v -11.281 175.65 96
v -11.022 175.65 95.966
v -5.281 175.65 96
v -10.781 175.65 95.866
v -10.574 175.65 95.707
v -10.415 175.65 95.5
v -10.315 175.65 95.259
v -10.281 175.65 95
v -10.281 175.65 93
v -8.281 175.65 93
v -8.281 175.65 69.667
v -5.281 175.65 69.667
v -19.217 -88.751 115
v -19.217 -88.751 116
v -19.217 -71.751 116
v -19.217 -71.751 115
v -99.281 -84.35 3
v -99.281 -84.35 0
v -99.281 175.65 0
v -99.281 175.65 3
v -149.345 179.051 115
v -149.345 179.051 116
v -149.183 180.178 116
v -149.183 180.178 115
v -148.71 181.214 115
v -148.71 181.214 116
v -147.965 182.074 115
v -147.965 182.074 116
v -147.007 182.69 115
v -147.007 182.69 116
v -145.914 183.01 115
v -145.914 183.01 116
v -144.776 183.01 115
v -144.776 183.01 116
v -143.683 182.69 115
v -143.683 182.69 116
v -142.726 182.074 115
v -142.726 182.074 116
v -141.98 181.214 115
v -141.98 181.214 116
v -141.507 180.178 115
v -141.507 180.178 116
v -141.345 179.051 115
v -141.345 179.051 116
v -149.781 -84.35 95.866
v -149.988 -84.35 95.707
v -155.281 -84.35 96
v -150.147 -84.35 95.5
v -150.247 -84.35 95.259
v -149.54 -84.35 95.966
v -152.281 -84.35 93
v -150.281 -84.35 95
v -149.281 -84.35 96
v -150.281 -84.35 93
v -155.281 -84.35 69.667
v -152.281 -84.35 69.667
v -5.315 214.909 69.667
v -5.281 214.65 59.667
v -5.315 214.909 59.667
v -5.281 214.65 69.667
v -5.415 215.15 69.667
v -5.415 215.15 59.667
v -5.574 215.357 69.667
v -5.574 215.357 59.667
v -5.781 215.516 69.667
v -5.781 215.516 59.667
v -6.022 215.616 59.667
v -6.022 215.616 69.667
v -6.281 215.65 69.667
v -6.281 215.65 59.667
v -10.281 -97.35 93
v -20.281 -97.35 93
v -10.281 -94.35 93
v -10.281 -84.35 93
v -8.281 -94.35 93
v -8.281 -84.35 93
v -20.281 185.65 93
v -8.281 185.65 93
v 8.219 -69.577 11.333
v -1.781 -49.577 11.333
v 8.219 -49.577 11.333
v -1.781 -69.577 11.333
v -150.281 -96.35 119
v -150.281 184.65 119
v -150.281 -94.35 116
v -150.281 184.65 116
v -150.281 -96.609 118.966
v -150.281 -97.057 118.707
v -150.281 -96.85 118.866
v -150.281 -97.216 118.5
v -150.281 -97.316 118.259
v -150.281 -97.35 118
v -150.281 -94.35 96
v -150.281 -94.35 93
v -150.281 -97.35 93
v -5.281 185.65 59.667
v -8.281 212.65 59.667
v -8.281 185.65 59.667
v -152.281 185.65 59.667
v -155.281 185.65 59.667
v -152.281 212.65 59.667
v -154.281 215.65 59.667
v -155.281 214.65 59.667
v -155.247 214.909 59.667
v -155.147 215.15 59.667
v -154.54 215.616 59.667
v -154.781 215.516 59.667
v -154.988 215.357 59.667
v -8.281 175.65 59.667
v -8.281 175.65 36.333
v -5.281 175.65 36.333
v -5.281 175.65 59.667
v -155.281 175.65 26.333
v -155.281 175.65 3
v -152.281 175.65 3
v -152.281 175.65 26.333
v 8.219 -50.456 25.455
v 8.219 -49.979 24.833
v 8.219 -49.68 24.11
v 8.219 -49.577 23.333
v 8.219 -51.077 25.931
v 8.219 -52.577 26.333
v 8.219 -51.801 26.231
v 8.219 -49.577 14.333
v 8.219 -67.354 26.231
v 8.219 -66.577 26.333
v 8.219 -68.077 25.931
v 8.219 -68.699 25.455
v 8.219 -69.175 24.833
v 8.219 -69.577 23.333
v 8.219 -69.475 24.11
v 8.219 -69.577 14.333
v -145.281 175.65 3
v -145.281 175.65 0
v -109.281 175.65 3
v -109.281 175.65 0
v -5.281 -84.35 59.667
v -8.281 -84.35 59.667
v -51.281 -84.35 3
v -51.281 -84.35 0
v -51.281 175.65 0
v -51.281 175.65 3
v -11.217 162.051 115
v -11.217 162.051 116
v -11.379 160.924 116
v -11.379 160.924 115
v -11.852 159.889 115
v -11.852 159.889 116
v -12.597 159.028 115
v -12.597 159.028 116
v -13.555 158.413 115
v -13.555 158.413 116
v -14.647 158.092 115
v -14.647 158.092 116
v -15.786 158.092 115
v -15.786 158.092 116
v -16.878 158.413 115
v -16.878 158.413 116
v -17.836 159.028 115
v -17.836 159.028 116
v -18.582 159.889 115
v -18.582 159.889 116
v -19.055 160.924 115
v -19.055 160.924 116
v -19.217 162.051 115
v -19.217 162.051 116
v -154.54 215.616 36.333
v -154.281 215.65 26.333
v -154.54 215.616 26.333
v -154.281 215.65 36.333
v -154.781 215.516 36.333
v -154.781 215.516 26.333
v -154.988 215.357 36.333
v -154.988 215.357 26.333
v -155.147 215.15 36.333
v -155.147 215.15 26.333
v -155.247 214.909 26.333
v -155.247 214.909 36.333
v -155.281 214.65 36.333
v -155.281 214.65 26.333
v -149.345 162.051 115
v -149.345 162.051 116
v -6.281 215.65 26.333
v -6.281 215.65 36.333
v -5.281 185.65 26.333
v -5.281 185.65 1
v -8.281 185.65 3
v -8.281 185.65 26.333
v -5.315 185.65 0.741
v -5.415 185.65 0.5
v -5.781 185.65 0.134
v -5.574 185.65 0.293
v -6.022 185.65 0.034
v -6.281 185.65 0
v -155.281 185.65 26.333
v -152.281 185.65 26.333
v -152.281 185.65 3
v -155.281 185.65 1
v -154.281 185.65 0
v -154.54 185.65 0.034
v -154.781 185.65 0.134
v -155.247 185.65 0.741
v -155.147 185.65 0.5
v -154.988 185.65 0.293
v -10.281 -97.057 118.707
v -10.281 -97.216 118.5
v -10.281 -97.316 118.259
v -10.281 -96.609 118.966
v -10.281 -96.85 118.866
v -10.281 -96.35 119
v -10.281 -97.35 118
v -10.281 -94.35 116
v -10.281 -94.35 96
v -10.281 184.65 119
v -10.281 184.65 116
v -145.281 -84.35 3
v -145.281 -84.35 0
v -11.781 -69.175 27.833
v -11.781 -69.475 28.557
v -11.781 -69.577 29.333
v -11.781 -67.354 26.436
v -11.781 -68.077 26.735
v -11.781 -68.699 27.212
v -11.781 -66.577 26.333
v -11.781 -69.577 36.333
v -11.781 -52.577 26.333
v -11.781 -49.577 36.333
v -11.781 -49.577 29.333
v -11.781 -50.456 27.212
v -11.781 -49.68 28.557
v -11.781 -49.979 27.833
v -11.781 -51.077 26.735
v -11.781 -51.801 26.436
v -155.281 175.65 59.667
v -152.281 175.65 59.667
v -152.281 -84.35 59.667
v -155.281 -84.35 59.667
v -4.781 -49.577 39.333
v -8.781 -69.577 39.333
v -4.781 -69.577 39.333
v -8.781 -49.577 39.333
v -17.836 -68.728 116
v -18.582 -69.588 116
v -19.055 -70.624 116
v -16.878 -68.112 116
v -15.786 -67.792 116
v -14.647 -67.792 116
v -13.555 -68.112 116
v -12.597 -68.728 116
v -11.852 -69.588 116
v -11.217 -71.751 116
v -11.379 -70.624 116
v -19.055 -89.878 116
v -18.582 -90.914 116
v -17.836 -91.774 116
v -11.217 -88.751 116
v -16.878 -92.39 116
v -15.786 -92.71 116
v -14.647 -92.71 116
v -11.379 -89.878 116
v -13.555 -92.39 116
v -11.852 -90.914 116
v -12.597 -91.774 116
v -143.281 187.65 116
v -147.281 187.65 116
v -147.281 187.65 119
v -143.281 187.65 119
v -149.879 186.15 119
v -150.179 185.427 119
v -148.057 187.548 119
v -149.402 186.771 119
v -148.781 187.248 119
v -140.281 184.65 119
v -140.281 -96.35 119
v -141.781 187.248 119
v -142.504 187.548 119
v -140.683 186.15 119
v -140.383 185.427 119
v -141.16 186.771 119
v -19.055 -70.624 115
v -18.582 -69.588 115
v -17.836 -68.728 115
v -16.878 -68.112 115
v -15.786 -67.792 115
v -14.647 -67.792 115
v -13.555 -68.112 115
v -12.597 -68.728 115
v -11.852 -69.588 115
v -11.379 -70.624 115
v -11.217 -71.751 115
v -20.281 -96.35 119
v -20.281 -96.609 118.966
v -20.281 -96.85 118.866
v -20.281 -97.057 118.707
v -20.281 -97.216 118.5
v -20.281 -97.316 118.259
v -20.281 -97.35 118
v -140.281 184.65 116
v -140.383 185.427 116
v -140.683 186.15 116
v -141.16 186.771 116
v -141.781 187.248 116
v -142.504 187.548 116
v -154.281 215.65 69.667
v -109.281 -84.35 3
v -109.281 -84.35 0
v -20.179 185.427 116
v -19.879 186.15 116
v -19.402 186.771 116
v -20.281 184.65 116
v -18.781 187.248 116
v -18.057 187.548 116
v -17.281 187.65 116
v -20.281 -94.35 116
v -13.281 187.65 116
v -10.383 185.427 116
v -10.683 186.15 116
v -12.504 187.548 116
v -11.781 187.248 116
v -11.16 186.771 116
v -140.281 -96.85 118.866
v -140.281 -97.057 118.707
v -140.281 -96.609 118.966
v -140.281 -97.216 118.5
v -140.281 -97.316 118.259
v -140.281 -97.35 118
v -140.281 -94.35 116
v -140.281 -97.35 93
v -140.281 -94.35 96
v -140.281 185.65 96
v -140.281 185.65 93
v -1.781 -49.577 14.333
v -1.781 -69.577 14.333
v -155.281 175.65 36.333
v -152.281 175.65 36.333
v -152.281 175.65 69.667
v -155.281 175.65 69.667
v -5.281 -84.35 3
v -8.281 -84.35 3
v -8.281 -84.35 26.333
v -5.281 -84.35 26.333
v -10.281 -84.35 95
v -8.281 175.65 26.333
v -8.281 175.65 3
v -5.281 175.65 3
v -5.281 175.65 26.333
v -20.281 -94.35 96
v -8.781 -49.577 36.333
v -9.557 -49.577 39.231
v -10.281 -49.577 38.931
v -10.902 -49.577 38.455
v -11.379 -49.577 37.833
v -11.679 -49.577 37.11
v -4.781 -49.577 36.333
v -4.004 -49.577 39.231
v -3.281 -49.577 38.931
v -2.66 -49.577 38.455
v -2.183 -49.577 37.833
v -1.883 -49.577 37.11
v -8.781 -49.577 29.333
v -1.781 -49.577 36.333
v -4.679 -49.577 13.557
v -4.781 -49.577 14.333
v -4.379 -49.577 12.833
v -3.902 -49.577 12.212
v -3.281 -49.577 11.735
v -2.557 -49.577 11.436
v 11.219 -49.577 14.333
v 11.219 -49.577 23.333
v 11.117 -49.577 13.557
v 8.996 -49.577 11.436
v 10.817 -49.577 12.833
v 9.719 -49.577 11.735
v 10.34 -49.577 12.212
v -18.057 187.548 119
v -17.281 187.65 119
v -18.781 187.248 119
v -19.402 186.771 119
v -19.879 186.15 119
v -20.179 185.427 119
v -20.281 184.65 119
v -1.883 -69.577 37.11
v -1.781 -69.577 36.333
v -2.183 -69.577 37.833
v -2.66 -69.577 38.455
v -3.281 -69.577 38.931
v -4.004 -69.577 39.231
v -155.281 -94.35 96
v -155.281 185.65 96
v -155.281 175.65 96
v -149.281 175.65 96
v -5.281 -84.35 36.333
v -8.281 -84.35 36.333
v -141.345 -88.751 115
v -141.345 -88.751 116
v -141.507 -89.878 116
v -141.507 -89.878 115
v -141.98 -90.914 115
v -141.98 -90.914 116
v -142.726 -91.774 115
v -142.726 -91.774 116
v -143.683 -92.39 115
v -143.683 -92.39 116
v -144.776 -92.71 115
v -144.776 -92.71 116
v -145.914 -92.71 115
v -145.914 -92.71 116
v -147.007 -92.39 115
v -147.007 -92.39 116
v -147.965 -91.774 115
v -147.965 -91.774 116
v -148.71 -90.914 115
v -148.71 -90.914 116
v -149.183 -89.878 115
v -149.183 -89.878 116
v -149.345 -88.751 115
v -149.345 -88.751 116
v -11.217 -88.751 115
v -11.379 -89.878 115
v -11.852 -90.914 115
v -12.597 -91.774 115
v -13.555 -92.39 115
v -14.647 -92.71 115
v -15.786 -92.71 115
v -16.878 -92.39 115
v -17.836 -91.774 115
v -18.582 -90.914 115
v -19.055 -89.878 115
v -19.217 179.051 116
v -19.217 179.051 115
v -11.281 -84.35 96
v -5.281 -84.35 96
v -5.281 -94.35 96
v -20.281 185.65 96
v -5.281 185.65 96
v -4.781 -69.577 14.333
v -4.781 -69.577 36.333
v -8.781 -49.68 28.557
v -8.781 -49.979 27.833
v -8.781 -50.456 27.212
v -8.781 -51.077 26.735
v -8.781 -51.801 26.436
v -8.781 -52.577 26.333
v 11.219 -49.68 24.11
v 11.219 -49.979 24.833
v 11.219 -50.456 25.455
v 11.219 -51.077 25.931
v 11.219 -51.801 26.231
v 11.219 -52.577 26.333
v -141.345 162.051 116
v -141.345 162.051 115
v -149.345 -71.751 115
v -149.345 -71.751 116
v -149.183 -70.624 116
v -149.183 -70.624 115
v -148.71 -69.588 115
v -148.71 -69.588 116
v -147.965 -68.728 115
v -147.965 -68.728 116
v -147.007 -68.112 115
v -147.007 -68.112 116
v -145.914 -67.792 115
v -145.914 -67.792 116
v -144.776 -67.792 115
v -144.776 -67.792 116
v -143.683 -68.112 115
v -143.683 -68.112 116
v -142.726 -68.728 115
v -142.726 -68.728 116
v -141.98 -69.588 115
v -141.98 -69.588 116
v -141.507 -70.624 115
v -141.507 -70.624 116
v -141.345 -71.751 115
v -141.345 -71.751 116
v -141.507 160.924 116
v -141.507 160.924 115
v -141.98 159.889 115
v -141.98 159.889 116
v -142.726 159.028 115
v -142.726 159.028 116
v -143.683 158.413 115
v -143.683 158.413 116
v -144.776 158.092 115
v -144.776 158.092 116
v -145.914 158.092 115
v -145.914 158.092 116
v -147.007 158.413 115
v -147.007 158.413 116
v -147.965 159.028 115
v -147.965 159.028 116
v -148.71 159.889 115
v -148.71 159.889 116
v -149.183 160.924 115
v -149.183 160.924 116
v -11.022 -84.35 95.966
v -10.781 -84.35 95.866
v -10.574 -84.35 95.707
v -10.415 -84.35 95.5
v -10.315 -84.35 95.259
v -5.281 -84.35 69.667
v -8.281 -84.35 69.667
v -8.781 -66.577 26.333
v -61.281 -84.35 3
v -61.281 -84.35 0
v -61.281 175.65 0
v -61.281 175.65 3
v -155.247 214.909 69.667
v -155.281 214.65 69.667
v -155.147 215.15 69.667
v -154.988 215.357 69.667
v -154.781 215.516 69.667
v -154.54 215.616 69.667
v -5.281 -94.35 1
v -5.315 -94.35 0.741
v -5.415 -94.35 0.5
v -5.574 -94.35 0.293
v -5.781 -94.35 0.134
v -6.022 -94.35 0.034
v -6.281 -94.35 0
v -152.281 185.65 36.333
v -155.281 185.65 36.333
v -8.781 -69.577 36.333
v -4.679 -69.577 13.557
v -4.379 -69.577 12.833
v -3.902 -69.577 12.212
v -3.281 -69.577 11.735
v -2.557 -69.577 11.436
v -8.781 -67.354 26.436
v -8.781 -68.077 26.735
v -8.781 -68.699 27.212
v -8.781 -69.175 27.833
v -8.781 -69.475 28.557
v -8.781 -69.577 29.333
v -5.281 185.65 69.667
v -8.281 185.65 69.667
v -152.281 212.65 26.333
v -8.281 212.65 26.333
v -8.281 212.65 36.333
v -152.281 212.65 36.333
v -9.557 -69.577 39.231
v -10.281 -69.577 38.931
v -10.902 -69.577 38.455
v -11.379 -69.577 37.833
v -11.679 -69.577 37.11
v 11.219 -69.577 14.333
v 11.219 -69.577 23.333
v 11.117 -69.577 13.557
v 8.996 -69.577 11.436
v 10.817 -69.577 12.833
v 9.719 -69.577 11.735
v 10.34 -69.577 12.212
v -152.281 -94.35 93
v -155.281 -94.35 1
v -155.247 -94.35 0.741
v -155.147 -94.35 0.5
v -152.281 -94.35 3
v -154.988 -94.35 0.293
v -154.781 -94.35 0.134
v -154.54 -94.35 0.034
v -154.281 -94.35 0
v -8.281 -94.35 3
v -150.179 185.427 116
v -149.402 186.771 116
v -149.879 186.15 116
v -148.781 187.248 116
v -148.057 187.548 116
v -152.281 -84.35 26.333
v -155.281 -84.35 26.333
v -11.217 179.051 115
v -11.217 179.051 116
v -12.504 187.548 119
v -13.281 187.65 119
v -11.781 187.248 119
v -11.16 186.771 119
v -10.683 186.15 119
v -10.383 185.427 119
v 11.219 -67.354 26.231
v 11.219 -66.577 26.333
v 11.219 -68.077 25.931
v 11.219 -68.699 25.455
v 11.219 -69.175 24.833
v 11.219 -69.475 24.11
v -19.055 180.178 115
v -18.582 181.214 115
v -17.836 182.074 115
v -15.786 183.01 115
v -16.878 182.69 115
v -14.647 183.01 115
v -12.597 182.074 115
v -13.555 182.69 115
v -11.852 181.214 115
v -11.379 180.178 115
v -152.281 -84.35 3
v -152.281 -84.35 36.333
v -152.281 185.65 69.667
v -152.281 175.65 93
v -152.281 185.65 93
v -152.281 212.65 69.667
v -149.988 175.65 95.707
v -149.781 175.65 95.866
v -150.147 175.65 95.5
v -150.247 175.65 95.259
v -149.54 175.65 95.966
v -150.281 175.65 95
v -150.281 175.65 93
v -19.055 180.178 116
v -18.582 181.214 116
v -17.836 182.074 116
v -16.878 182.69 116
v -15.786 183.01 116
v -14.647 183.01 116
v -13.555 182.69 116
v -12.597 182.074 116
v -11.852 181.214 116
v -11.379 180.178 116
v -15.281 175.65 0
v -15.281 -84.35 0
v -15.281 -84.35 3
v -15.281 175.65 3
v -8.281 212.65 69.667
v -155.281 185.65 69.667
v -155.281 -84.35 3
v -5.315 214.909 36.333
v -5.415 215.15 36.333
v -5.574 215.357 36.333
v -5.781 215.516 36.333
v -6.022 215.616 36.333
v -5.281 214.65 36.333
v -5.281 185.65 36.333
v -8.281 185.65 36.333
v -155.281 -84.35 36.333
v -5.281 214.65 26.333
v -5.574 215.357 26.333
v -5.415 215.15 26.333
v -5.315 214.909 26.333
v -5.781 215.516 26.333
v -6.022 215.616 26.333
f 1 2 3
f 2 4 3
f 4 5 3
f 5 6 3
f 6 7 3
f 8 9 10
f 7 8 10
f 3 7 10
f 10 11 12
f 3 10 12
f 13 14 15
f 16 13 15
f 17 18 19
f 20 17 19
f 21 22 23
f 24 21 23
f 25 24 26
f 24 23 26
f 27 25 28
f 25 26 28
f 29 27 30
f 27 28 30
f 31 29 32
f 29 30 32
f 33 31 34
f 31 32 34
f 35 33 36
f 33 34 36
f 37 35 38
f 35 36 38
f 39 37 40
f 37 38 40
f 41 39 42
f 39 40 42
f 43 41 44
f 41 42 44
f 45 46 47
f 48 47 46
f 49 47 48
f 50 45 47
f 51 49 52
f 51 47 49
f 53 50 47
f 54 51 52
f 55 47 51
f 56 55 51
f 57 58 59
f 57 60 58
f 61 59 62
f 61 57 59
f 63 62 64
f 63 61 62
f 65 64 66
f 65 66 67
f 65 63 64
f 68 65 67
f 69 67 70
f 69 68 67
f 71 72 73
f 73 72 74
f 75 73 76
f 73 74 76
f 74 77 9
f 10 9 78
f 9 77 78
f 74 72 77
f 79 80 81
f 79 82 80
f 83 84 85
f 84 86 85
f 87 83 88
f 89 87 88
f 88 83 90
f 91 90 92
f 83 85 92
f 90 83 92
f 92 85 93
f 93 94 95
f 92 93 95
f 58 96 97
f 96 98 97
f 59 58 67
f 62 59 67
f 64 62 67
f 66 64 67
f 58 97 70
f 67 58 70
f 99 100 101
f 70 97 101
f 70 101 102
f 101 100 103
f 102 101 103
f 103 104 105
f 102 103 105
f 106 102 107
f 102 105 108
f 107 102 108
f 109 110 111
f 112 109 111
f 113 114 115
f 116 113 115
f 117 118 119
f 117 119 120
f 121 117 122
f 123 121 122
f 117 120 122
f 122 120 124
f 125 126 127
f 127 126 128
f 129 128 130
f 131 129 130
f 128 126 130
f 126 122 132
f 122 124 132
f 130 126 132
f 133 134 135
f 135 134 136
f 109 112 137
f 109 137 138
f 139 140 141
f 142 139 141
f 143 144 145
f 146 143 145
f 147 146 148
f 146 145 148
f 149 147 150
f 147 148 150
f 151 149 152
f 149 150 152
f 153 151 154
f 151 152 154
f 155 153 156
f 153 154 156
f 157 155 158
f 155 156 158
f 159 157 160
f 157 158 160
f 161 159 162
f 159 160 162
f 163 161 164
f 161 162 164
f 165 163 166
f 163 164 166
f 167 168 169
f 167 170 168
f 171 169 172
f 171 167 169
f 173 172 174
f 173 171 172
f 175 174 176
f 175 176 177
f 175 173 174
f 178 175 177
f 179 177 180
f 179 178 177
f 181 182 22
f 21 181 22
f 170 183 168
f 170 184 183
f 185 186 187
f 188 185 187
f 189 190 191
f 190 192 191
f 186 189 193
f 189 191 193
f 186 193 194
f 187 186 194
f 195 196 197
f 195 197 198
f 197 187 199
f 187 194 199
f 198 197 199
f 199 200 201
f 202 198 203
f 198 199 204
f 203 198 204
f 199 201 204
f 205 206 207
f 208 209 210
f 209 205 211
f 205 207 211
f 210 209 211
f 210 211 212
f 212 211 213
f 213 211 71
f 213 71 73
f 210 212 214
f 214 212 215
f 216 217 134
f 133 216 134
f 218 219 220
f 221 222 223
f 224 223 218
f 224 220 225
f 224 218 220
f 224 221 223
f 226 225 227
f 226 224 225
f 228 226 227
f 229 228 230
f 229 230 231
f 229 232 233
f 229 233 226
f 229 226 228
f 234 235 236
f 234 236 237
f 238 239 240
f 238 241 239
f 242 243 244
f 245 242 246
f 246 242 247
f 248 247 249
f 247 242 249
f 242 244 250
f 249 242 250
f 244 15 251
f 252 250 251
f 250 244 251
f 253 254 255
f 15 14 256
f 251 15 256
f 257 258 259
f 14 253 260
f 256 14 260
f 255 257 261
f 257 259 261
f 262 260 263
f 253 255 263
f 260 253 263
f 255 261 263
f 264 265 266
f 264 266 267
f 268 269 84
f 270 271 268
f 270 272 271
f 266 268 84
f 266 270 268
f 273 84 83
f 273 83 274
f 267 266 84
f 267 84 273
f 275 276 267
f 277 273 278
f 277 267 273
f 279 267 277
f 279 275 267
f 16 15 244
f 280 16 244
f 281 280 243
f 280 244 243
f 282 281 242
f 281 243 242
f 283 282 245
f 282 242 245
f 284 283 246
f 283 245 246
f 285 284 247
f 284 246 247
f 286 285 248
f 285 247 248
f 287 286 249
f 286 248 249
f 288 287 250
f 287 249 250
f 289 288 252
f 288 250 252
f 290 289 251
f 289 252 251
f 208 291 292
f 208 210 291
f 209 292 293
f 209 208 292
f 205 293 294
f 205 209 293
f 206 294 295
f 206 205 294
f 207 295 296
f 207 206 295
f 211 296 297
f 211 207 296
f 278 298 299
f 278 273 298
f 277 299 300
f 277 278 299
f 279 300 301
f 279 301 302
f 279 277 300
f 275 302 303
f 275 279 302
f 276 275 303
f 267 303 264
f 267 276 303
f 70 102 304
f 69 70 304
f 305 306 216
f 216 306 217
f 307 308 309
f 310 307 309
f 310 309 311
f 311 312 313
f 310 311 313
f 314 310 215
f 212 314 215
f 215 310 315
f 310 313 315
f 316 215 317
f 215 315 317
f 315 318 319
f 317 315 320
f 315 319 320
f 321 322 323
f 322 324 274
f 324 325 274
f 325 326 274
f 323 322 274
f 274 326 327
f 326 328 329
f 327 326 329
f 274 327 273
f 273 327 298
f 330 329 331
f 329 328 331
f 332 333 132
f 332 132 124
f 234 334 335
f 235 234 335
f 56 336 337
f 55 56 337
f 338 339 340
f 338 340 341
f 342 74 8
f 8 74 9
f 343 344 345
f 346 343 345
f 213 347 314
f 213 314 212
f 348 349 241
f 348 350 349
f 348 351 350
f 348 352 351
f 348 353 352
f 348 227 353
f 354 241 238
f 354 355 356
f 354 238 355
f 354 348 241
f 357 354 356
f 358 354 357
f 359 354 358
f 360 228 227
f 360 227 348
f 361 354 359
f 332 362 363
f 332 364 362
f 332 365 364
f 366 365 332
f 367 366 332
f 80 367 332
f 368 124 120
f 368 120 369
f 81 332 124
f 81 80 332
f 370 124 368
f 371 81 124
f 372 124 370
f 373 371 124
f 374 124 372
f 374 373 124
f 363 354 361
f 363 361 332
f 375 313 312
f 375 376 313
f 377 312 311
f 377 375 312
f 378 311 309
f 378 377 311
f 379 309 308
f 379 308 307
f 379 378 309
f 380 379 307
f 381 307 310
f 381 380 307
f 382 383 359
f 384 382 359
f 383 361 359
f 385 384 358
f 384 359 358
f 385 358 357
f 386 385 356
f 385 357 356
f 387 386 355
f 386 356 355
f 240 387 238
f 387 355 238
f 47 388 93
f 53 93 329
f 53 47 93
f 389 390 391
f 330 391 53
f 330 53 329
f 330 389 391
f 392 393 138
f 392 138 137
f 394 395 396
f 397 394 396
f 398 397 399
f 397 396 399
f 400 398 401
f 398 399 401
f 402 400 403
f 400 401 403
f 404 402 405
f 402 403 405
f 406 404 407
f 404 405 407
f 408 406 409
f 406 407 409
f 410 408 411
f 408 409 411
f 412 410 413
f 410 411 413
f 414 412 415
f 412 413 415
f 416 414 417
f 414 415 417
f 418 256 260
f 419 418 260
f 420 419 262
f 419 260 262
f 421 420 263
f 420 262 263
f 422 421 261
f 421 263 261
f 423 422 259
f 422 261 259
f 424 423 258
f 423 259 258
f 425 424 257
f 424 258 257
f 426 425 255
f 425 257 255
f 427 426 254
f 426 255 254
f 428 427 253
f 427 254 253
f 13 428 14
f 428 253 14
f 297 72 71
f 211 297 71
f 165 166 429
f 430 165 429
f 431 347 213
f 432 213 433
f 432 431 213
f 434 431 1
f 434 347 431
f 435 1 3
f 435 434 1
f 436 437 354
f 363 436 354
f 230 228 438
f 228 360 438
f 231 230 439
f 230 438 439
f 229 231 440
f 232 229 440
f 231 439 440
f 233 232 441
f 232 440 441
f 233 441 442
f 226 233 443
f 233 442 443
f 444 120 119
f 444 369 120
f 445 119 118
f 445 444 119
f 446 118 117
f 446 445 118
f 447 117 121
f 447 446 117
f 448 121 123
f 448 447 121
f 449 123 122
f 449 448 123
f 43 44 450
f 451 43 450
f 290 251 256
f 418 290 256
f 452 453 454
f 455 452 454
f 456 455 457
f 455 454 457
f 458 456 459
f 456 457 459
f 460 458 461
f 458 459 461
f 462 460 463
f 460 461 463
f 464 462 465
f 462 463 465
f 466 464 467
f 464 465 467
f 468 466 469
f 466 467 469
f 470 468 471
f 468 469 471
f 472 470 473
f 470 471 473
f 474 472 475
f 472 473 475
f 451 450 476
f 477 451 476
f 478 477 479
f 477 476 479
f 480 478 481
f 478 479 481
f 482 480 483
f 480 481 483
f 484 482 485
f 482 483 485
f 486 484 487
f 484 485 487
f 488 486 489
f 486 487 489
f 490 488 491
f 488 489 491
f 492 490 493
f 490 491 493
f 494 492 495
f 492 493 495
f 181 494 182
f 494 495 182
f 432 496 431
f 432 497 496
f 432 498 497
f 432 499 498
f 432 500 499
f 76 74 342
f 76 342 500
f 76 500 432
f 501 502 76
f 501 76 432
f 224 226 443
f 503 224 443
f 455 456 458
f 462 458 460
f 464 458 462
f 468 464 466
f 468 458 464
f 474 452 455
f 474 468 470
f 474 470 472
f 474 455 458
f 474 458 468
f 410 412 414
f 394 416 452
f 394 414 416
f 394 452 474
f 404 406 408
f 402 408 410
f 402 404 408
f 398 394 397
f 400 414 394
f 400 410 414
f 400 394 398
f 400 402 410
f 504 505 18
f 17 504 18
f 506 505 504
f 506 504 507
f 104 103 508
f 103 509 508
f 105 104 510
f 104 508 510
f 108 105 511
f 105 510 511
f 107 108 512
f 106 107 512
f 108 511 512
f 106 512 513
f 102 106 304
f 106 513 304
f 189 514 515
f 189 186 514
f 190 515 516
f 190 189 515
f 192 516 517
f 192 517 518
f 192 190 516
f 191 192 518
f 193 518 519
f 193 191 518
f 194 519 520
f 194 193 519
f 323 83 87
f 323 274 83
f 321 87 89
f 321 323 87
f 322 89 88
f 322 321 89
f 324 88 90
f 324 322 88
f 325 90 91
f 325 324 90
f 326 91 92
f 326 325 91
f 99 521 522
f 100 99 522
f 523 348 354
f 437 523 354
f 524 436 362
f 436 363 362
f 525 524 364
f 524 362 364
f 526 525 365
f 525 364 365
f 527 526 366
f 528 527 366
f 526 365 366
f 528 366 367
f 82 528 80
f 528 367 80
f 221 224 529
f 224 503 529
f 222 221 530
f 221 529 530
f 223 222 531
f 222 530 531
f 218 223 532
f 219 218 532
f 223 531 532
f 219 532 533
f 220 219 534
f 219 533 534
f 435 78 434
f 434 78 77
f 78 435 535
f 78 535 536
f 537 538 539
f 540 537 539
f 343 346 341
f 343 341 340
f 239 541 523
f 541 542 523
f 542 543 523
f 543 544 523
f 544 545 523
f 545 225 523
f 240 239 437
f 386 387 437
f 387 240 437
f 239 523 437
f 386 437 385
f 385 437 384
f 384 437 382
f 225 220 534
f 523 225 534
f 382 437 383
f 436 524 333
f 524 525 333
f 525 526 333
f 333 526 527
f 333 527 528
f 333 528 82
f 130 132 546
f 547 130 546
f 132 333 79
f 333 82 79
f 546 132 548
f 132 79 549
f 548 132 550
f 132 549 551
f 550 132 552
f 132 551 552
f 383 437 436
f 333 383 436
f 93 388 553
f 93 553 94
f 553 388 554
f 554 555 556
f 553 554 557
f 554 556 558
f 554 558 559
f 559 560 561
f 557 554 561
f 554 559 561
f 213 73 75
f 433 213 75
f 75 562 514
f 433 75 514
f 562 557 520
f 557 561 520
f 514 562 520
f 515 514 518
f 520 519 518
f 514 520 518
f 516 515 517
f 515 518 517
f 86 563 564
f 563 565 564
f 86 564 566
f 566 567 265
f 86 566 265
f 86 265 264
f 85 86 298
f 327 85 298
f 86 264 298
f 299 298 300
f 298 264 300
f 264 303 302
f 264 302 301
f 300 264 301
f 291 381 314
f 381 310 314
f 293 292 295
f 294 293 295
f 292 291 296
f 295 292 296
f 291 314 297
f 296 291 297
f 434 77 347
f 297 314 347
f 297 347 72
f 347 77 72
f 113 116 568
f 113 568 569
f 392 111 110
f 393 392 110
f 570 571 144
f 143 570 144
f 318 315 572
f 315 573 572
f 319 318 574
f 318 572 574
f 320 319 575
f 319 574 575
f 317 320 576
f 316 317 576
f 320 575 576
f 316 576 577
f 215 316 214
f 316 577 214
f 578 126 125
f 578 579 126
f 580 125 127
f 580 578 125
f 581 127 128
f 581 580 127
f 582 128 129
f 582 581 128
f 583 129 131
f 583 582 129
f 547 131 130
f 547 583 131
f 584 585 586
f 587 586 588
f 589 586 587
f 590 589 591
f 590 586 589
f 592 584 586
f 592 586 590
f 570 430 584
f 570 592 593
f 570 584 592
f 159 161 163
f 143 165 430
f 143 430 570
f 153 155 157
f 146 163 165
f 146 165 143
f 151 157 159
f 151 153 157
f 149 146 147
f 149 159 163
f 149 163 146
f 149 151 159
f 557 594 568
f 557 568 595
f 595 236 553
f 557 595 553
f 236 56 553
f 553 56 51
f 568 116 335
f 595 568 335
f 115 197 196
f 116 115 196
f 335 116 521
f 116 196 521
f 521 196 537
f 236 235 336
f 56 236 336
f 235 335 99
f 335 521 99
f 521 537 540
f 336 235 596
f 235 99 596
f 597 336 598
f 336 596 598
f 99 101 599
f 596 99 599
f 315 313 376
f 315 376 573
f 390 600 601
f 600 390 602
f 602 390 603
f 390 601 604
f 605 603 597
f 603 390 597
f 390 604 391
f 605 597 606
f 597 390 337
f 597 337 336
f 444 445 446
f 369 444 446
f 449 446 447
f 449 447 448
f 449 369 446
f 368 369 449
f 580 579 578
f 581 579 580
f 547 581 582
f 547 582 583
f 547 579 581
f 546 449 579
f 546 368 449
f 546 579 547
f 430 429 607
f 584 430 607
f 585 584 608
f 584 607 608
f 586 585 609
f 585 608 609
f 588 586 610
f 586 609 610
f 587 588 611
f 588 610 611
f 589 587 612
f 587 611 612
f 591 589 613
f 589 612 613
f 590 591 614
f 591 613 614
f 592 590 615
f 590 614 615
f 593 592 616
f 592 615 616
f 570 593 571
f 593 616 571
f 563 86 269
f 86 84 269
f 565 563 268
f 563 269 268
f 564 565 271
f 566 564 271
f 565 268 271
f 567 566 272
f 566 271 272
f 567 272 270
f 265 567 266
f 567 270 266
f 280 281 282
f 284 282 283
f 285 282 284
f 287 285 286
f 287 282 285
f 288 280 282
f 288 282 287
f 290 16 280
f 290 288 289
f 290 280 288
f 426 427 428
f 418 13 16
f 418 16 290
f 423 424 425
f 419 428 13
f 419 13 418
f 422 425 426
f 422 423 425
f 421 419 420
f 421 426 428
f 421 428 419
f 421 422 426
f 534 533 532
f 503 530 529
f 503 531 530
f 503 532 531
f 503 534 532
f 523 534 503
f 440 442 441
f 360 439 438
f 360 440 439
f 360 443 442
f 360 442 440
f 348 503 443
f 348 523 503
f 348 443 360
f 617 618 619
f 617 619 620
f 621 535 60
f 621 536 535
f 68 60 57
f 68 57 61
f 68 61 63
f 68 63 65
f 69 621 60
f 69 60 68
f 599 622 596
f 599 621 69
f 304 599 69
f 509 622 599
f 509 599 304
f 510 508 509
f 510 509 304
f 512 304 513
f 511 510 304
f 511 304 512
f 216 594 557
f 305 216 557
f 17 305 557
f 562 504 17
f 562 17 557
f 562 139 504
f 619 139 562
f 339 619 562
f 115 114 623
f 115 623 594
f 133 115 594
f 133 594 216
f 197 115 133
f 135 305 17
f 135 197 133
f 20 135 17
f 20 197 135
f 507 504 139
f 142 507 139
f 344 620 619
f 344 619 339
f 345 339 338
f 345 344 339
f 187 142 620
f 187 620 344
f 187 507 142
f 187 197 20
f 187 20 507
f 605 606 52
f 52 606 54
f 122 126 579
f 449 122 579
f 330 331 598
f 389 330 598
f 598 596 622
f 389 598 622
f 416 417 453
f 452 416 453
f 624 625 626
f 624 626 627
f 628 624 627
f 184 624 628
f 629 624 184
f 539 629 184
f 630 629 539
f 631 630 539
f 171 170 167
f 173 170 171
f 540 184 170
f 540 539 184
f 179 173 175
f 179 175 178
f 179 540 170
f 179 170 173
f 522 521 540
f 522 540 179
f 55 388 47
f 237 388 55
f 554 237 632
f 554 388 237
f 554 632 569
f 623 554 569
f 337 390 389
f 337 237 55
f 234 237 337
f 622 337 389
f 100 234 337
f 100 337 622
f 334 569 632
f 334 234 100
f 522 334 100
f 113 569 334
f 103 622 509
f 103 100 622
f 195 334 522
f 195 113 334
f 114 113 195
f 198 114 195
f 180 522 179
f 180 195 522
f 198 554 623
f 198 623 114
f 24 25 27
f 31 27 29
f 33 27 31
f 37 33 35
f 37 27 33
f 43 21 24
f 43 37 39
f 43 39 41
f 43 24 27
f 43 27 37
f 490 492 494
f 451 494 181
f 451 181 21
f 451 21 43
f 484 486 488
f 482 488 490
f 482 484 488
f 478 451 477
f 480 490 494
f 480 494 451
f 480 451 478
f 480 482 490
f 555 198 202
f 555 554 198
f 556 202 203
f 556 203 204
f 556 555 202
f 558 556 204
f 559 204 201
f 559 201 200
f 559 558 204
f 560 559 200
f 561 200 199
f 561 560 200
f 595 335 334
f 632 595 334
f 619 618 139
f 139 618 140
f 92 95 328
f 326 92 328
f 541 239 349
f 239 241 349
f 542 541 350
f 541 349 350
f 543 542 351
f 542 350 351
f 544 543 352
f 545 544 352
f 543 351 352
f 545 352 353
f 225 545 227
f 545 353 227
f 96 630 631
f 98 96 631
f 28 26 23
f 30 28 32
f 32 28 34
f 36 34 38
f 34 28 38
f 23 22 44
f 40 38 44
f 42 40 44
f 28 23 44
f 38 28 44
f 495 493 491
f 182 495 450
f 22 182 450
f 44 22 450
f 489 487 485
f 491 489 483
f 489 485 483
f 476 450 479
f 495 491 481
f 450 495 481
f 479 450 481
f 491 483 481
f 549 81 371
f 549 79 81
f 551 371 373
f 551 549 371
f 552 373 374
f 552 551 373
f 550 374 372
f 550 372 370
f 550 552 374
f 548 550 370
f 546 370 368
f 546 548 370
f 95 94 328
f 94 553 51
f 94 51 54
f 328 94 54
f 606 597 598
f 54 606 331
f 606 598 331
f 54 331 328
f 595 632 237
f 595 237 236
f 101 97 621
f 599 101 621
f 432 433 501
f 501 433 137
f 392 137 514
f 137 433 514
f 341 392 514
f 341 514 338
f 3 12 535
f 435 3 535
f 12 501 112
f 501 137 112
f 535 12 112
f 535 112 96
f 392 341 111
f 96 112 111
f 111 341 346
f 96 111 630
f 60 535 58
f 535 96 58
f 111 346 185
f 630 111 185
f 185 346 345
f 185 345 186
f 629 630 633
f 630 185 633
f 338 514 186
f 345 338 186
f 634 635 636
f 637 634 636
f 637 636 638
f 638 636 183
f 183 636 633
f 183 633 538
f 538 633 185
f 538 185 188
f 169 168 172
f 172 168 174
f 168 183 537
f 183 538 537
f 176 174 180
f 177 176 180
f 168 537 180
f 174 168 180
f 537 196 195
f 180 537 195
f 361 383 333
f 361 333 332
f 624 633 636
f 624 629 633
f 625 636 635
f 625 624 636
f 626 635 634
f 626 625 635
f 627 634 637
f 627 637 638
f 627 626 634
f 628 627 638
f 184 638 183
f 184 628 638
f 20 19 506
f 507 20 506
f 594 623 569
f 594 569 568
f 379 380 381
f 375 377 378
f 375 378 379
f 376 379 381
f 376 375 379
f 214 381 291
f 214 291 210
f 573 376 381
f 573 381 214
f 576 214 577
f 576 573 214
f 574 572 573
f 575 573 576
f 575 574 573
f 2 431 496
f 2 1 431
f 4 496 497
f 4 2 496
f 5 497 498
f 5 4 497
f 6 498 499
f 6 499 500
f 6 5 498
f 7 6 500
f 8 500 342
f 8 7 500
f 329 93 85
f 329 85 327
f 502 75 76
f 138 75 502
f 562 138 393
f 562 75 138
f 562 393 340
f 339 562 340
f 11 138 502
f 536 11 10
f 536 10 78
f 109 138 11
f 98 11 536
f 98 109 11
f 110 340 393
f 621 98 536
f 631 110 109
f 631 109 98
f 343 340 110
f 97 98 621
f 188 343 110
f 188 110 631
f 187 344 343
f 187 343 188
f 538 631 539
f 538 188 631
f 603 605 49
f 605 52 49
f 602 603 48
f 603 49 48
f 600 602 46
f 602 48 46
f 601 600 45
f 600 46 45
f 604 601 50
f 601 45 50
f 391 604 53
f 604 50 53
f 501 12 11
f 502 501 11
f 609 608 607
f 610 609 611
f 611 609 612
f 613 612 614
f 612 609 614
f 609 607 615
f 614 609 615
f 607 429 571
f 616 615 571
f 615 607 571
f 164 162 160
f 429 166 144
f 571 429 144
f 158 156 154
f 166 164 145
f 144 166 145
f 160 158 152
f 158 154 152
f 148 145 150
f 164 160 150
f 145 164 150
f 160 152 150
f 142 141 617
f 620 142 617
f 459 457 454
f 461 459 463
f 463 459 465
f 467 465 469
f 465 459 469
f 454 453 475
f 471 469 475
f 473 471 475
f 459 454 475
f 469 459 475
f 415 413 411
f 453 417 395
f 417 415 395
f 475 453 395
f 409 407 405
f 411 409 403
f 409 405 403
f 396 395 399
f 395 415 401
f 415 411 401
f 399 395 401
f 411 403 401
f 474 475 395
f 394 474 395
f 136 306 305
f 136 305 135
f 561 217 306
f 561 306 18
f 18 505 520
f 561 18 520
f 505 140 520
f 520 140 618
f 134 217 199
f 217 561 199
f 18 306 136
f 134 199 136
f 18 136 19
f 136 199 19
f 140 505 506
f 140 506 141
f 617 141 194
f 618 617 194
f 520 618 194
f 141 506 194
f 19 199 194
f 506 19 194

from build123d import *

# Parameters (mm, degrees)
F0_W           = 10
F0_H           = 260
F1_DEPTH       = 3
F2_W           = 3
F2_H           = 10
F3_DEPTH       = 90
F4_W           = 2
F4_H           = 10
F4_W_2         = 3
F4_W_3         = 10
F4_H_2         = 3
F4_W_4         = 5
F5_DEPTH       = 3
F6_W           = 10
F6_H           = 3
F7_DEPTH       = 20
F8_W           = 10
F8_H           = 282
F8_H_2         = 285
F8_H_3         = 3
F9_DEPTH       = 3
F10_W          = 3
F10_H          = 10
F11_DEPTH      = 30
F11_DEPTH_BACK = 270
F12_W          = 3
F12_H          = 10
F13_DEPTH      = 144
F14_R          = 1
F15_R          = 3
F17_DEPTH      = 1
F18_W          = 3
F18_H          = 20
F19_DEPTH      = 10
F18_W_2        = 0.5
F20_DEPTH      = 3
F21_DEPTH      = 25
F22_W          = 20
F22_H          = 3
F23_DEPTH      = 10
F24_W          = 3
F24_H          = 20
F25_DEPTH      = 15
F26_R          = 3


# Not quite as in the source:
# - a feature names something its author has since deleted; it is built from what else it names


with BuildPart() as f1:
    # F0 (on Top) → F1 (new body)
    with BuildSketch(Plane.XY):
        Polygon((-5.2808651924, 185.6500792865), (-155.2808651924, 185.6500792865), (-155.2808651924, 175.6500792865), (-145.2808651924, 175.6500792865), (-109.2808651924, 175.6500792865), (-99.2808651924, 175.6500792865), (-61.2808651924, 175.6500792865), (-51.2808651924, 175.6500792865), (-15.2808651924, 175.6500792865), (-5.2808651924, 175.6500792865), align=None)
        with Locations((-104.2808651924, 45.6500792865)):
            Rectangle(F0_W, F0_H)
        with Locations((-56.2808651924, 45.6500792865)):
            Rectangle(F0_W, F0_H)
        Polygon((-145.2808651924, -84.3499207135), (-155.2808651924, -84.3499207135), (-155.2808651924, -94.3499207135), (-5.2808651924, -94.3499207135), (-5.2808651924, -84.3499207135), (-15.2808651924, -84.3499207135), (-51.2808651924, -84.3499207135), (-61.2808651924, -84.3499207135), (-99.2808651924, -84.3499207135), (-109.2808651924, -84.3499207135), align=None)
        with Locations((-150.2808651924, 45.6500792865)):
            Rectangle(F0_W, F0_H)
        with Locations((-10.2808651924, 45.6500792865)):
            Rectangle(F0_W, F0_H)
    extrude(amount=F1_DEPTH)

    # F2 (on face) → F3 (join)
    with BuildSketch(Plane.XY.offset(3)):
        with Locations((-153.7808651924, 180.6500792865)):
            Rectangle(F2_W, F2_H)
        with Locations((-6.7808651924, 180.6500792865)):
            Rectangle(F2_W, F2_H)
        with Locations((-6.7808651924, -89.3499207135)):
            Rectangle(F2_W, F2_H)
        with Locations((-153.7808651924, -89.3499207135)):
            Rectangle(F2_W, F2_H)
    extrude(amount=F3_DEPTH)

    # F4 (on face) → F5 (join)
    with BuildSketch(Plane.XY.offset(93)):
        Polygon((-140.2808651924, 185.6500792865), (-150.2808651924, 185.6500792865), (-150.2808651924, 175.6500792865), (-150.2808651924, -84.3499207135), (-150.2808651924, -94.3499207135), (-140.2808651924, -94.3499207135), align=None)
        with Locations((-151.2808651924, 180.6500792865)):
            Rectangle(F4_W, F4_H)
        with Locations((-153.7808651924, 180.6500792865)):
            Rectangle(F4_W_2, F4_H)
        with Locations((-145.2808651924, -95.8499207135)):
            Rectangle(F4_W_3, F4_H_2)
        with Locations((-15.2808651924, -95.8499207135)):
            Rectangle(F4_W_3, F4_H_2)
        Polygon((-10.2808651924, 185.6500792865), (-20.2808651924, 185.6500792865), (-20.2808651924, -94.3499207135), (-10.2808651924, -94.3499207135), (-10.2808651924, -84.3499207135), (-10.2808651924, 175.6500792865), align=None)
        with Locations((-7.7808651924, -89.3499207135)):
            Rectangle(F4_W_4, F4_H)
        with Locations((-7.7808651924, 180.6500792865)):
            Rectangle(F4_W_4, F4_H)
        with Locations((-152.7808651924, -89.3499207135)):
            Rectangle(F4_W_4, F4_H)
    extrude(amount=F5_DEPTH)

    # F6 (on face) → F7 (join)
    with BuildSketch(Plane.XY.offset(96)):
        with Locations((-145.2808651924, -95.8499207135)):
            Rectangle(F6_W, F6_H)
        with Locations((-15.2808651924, -95.8499207135)):
            Rectangle(F6_W, F6_H)
    extrude(amount=F7_DEPTH)

    # F8 (on face) → F9 (join)
    with BuildSketch(Plane.XY.offset(116)):
        with Locations((-145.2808651924, 46.6500792865)):
            Rectangle(F8_W, F8_H)
        with Locations((-15.2808651924, 45.1500792865)):
            Rectangle(F8_W, F8_H_2)
        with Locations((-145.2808651924, -95.8499207135)):
            Rectangle(F8_W, F8_H_3)
    extrude(amount=F9_DEPTH)

    # F10 (on face) → F11 (join, two sides)
    with BuildSketch(Plane(origin=(0, 185.6500792865, 0), x_dir=(-1, 0, 0), z_dir=(0, 1, 0))) as f11_sk:
        with Locations((153.7808651924, 64.6666666667)):
            Rectangle(F10_W, F10_H)
        with Locations((153.7808651924, 31.3333333333)):
            Rectangle(F10_W, F10_H)
        with Locations((6.7808651924, 64.6666666667)):
            Rectangle(F10_W, F10_H)
        with Locations((6.7808651924, 31.3333333333)):
            Rectangle(F10_W, F10_H)
    extrude(amount=F11_DEPTH)
    extrude(f11_sk.sketch, amount=-F11_DEPTH_BACK)

    # F12 (on face) → F13 (join, through all)
    with BuildSketch(Plane.YZ.offset(-152.2808651924)):
        with Locations((214.1500792864, 64.6666666667)):
            Rectangle(F12_W, F12_H)
        with Locations((214.1500792864, 31.3333333333)):
            Rectangle(F12_W, F12_H)
    extrude(amount=F13_DEPTH)

    # F14
    f14_edges = [f1.edges().sort_by_distance(p)[0] for p in [
        (-155.280865, 45.650079, 0),
        (-5.280865, 45.650079, 0),
        (-5.280865, 215.650079, 31.333333),
        (-5.280865, 215.650079, 64.666667),
        (-155.280865, 215.650079, 64.666667),
        (-155.280865, 215.650079, 31.333333),
        (-150.280865, 45.650079, 96),
        (-145.280865, -97.349921, 119),
        (-15.280865, -97.349921, 119),
        (-10.280865, 45.650079, 96),
    ]]
    fillet(f14_edges, radius=F14_R)

    # F15
    f15_edges = [f1.edges().sort_by_distance(p)[0] for p in [
        (-140.280865, 187.650079, 117.5),
        (-150.280865, 187.650079, 117.5),
        (-20.280865, 187.650079, 117.5),
        (-10.280865, 187.650079, 117.5),
    ]]
    fillet(f15_edges, radius=F15_R)


with BuildPart() as f17:
    # F16 (on face) → F17 (new body)
    with BuildSketch(Plane(origin=(0, 0, 116), x_dir=(1, 0, 0), z_dir=(0, 0, -1))):
        with BuildLine():
            ThreePointArc((-149.3451507241, -179.0511412621), (-145.3451507241, -183.0511412621), (-141.3451507241, -179.0511412621))
            Line((-141.3451507241, -179.0511412621), (-141.3451507241, -162.0511412621))
            ThreePointArc((-141.3451507241, -162.0511412621), (-145.3451507241, -158.0511412621), (-149.3451507241, -162.0511412621))
            Line((-149.3451507241, -162.0511412621), (-149.3451507241, -179.0511412621))
        make_face()
    extrude(amount=F17_DEPTH)


with BuildPart() as f17b:
    # F16 (on face) → F17, piece 2 (new body)
    with BuildSketch(Plane(origin=(0, 0, 116), x_dir=(1, 0, 0), z_dir=(0, 0, -1))):
        with BuildLine():
            ThreePointArc((-11.2165796608, -162.0511412621), (-15.2165796608, -158.0511412621), (-19.2165796608, -162.0511412621))
            Line((-19.2165796608, -162.0511412621), (-19.2165796608, -179.0511412621))
            ThreePointArc((-19.2165796608, -179.0511412621), (-15.2165796608, -183.0511412621), (-11.2165796608, -179.0511412621))
            Line((-11.2165796608, -179.0511412621), (-11.2165796608, -162.0511412621))
        make_face()
    extrude(amount=F17_DEPTH)


with BuildPart() as f17c:
    # F16 (on face) → F17, piece 3 (new body)
    with BuildSketch(Plane(origin=(0, 0, 116), x_dir=(1, 0, 0), z_dir=(0, 0, -1))):
        with BuildLine():
            ThreePointArc((-11.2165796608, 88.7509826891), (-15.2165796608, 92.7509826891), (-19.2165796608, 88.7509826891))
            Line((-19.2165796608, 88.7509826891), (-19.2165796608, 71.7509826891))
            ThreePointArc((-19.2165796608, 71.7509826891), (-15.2165796608, 67.7509826891), (-11.2165796608, 71.7509826891))
            Line((-11.2165796608, 71.7509826891), (-11.2165796608, 88.7509826891))
        make_face()
    extrude(amount=F17_DEPTH)


with BuildPart() as f17d:
    # F16 (on face) → F17, piece 4 (new body)
    with BuildSketch(Plane(origin=(0, 0, 116), x_dir=(1, 0, 0), z_dir=(0, 0, -1))):
        with BuildLine():
            Line((-149.3451507241, 88.7509826891), (-149.3451507241, 71.7509826891))
            ThreePointArc((-149.3451507241, 71.7509826891), (-145.3451507241, 67.7509826891), (-141.3451507241, 71.7509826891))
            Line((-141.3451507241, 71.7509826891), (-141.3451507241, 88.7509826891))
            ThreePointArc((-141.3451507241, 88.7509826891), (-145.3451507241, 92.7509826891), (-149.3451507241, 88.7509826891))
        make_face()
    extrude(amount=F17_DEPTH)


with BuildPart() as f19:
    # F18 (on face) → F19 (new body, through all)
    with BuildSketch(Plane.XY.offset(36.3333333333)):
        with Locations((-10.2808651924, -59.5772841573)):
            Rectangle(F18_W, F18_H)
    extrude(amount=-F19_DEPTH)

    # F18 (on face) → F20 (join)
    with BuildSketch(Plane.XY.offset(36.3333333333)):
        with Locations((-10.2808651924, -59.5772841573)):
            Rectangle(F18_W, F18_H)
        with Locations((-6.7808651924, -59.5772841573)):
            Rectangle(F18_W, F18_H)
        with Locations((-8.5308651924, -59.5772841573)):
            Rectangle(F18_W_2, F18_H)
        with Locations((-5.0308651924, -59.5772841573)):
            Rectangle(F18_W_2, F18_H)
        with Locations((-3.2808651924, -59.5772841573)):
            Rectangle(F18_W, F18_H)
    extrude(amount=F20_DEPTH)

    # F18 (on face) → F21 (join)
    with BuildSketch(Plane.XY.offset(36.3333333333)):
        with Locations((-3.2808651924, -59.5772841573)):
            Rectangle(F18_W, F18_H)
    extrude(amount=-F21_DEPTH)

    # F22 (on face) → F23 (join)
    with BuildSketch(Plane.YZ.offset(-1.7808651924)):
        with Locations((-59.5772841573, 12.8333333333)):
            Rectangle(F22_W, F22_H)
    extrude(amount=F23_DEPTH)

    # F24 (on face) → F25 (join)
    with BuildSketch(Plane(origin=(0, 0, 11.3333333333), x_dir=(1, 0, 0), z_dir=(0, 0, -1))):
        with Locations((9.7191348076, 59.5772841573)):
            Rectangle(F24_W, F24_H)
    extrude(amount=-F25_DEPTH)

    # F26
    f26_edges = [f19.edges().sort_by_distance(p)[0] for p in [
        (9.719135, -69.577284, 26.333333),
        (9.719135, -49.577284, 26.333333),
        (11.219135, -59.577284, 11.333333),
        (-4.780865, -59.577284, 11.333333),
        (-1.780865, -59.577284, 39.333333),
        (-11.780865, -59.577284, 39.333333),
        (-10.280865, -69.577284, 26.333333),
        (-10.280865, -49.577284, 26.333333),
    ]]
    fillet(f26_edges, radius=F26_R)


solid = Compound([f1.part, f17.part, f17b.part, f17c.part, f17d.part, f19.part])
